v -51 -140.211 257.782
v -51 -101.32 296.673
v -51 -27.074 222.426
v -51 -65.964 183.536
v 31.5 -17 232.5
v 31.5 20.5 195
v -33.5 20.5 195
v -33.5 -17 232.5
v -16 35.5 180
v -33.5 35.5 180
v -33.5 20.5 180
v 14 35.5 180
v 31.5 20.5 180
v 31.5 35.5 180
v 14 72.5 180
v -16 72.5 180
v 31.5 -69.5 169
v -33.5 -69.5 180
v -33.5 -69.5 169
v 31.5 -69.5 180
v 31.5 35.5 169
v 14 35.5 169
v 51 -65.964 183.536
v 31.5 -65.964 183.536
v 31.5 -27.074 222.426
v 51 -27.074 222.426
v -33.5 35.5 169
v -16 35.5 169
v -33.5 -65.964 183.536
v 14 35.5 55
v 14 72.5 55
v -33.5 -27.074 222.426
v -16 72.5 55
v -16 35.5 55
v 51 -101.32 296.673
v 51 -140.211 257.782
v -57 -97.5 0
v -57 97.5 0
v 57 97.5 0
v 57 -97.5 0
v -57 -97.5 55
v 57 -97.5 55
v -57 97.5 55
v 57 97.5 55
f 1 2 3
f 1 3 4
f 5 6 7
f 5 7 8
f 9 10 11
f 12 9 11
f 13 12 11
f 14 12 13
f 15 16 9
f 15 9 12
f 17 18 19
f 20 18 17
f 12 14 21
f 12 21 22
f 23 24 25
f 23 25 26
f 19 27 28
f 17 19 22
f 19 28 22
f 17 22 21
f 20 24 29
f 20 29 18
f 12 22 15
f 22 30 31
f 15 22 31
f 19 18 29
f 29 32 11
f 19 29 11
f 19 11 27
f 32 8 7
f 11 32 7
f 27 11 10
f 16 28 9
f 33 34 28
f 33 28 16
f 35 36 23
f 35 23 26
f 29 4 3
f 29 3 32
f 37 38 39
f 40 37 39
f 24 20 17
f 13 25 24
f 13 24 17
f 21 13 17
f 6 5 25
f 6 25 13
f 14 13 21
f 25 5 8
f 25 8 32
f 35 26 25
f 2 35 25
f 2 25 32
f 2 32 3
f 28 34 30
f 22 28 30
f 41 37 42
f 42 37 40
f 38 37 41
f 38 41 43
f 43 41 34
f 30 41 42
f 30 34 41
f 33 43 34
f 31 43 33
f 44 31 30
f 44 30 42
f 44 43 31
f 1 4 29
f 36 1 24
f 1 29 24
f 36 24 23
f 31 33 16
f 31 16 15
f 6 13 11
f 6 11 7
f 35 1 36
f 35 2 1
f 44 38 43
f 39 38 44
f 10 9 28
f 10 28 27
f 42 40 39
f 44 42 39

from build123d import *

# Parameters (mm, degrees)
F0_W     = 114
F0_H     = 195
F1_DEPTH = 55
F2_W     = 30
F2_H     = 37
F3_DEPTH = 125
F5_DEPTH = 11
F7_DEPTH = 65
F9_DEPTH = 105


with BuildPart() as f1:
    # F0 (on Top) → F1 (new body)
    with BuildSketch(Plane.XY):
        Rectangle(F0_W, F0_H)
    extrude(amount=F1_DEPTH)

    # F2 (on face) → F3 (join)
    with BuildSketch(Plane.XY.offset(55)):
        with Locations((-1, 54)):
            Rectangle(F2_W, F2_H)
    extrude(amount=F3_DEPTH)

    # F4 (on face) → F5 (join)
    with BuildSketch(Plane.XY.offset(180)):
        Polygon((14, 35.5), (-1, 35.5), (-16, 35.5), (-33.5, 35.5), (-33.5, -69.5), (-1, -69.5), (31.5, -69.5), (31.5, 35.5), align=None)
    extrude(amount=-F5_DEPTH)

    # F6 (on face) → F7 (join, through all)
    with BuildSketch(Plane.YZ.offset(31.5)):
        Polygon((-17, 232.5), (-69.5, 180), (20.5, 180), (20.5, 195), align=None)
    extrude(amount=-F7_DEPTH)

    # F8 (on face) → F9 (join)
    with BuildSketch(Plane(origin=(0, -124.75, 124.75), x_dir=(1, 0, 0), z_dir=(0, -0.707107, 0.707107))):
        Polygon((-51, 83.135299), (-33.5, 83.135299), (0, 83.135299), (33.5, 83.135299), (51, 83.135299), (51, 138.135299), (0, 138.135299), (-51, 138.135299), align=None)
    extrude(amount=F9_DEPTH)


solid = f1.part
